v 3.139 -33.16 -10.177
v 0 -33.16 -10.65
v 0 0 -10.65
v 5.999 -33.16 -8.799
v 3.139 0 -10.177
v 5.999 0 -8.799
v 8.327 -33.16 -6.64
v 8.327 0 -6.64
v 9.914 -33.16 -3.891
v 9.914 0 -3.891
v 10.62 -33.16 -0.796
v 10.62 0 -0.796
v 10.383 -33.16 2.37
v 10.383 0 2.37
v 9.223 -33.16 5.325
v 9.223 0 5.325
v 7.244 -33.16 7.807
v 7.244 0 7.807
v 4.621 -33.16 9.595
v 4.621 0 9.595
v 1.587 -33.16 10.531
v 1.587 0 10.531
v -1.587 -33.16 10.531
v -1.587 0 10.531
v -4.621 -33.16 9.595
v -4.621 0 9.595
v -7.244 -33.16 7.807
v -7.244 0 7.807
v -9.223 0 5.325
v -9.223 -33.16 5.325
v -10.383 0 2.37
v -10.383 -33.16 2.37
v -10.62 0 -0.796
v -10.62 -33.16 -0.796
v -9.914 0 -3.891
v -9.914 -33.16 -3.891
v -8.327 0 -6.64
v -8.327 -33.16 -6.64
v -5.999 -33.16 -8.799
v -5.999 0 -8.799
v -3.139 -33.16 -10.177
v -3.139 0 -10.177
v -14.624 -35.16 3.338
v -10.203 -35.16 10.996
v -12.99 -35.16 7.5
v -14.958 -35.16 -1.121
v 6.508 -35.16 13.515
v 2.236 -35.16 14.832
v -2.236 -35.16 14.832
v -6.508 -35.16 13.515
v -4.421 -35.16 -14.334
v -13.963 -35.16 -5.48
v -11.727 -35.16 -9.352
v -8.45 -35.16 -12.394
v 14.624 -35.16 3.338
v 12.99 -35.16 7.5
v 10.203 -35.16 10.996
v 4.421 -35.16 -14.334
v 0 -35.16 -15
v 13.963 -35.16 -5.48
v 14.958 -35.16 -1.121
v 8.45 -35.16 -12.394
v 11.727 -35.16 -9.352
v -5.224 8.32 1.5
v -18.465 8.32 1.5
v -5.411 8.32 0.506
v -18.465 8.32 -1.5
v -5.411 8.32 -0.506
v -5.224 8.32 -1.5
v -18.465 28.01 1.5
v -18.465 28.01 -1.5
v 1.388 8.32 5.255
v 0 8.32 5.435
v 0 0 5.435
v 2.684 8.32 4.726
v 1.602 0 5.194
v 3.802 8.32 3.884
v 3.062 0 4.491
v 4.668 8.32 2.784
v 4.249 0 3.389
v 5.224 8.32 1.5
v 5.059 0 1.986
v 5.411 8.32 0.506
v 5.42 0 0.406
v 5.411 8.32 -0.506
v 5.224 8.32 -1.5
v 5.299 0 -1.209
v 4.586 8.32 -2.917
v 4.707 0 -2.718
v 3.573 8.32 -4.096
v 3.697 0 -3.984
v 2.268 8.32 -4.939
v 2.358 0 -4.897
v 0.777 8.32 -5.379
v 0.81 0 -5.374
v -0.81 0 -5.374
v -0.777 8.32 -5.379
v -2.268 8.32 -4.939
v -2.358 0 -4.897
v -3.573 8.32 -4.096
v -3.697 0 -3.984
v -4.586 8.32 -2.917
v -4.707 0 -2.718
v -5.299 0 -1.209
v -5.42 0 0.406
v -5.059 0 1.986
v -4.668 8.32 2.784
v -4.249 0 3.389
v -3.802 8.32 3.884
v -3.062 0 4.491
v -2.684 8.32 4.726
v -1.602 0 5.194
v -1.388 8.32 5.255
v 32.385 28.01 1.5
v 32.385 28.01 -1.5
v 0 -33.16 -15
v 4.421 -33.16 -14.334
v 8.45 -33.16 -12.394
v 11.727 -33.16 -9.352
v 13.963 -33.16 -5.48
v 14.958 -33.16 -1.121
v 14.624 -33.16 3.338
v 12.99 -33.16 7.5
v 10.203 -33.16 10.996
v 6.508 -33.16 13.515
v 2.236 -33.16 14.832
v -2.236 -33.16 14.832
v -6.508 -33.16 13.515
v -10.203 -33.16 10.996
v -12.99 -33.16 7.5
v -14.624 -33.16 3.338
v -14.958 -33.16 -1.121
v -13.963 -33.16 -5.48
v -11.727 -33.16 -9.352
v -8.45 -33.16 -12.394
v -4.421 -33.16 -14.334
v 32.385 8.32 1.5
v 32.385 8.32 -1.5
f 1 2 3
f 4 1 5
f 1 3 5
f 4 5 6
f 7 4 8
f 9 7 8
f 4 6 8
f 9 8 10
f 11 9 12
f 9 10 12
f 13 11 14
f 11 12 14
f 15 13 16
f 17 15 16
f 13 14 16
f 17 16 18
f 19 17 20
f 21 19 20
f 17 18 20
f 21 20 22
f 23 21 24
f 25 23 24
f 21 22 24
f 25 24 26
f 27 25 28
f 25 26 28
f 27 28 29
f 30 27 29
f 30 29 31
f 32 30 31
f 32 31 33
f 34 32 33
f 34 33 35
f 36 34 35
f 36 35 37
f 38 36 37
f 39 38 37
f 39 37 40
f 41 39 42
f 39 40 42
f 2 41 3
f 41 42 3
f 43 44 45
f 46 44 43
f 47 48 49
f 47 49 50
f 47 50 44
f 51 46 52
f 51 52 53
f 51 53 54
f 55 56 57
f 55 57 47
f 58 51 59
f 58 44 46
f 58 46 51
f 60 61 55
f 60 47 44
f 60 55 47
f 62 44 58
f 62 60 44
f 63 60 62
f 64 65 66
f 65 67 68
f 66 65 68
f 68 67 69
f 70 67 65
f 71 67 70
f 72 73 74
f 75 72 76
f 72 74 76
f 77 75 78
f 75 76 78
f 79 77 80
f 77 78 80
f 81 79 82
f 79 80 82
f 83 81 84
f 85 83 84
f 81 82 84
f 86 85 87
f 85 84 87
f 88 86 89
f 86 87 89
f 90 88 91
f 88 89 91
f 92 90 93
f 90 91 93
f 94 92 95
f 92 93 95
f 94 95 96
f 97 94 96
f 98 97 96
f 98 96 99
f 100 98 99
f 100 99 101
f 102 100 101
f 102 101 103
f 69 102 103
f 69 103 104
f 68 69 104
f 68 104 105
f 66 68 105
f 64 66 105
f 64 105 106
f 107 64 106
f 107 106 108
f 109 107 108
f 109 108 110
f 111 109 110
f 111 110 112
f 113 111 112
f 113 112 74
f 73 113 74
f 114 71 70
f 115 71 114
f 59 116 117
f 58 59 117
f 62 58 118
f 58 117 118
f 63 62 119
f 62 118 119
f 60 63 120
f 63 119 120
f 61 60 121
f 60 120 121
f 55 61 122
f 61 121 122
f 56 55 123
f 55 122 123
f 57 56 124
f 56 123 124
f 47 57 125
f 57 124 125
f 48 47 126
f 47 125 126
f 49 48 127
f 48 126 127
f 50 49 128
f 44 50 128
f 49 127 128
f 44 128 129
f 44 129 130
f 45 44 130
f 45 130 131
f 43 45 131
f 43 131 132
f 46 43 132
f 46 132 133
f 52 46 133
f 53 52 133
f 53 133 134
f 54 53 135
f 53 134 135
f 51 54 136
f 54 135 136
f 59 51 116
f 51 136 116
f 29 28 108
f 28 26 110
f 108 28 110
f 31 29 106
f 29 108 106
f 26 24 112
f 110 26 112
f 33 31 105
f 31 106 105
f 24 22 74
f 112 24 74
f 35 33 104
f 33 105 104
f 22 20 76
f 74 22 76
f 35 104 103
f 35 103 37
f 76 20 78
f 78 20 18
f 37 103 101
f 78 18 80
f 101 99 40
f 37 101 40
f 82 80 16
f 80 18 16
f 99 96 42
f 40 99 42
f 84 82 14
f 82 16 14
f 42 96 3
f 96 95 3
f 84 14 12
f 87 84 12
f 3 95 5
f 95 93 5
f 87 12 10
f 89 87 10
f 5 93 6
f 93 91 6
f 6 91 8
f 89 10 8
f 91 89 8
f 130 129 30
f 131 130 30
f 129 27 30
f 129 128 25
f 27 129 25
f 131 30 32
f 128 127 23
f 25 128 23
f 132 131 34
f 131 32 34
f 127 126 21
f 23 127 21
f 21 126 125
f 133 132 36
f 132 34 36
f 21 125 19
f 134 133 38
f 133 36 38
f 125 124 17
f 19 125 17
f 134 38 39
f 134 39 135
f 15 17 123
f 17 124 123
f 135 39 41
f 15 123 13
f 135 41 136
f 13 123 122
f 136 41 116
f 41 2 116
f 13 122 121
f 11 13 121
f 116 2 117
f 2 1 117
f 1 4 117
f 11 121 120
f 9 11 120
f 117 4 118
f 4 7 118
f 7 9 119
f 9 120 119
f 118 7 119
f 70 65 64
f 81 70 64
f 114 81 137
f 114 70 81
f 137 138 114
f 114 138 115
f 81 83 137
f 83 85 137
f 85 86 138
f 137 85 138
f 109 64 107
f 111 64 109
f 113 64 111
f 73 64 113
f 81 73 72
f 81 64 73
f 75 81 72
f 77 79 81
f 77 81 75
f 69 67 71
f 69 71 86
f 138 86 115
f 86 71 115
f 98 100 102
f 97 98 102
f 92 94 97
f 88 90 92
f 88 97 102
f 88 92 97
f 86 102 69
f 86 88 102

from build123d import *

# Parameters (mm, degrees)
SKETCH2_R                = 5.435
BOSS_EXTRUDE1_DEPTH      = 8.32
BOSS_EXTRUDE2_DEPTH      = 1.5
BOSS_EXTRUDE2_DEPTH_BACK = 1.5
SKETCH4_W                = 50.85
SKETCH4_H                = 19.69
SKETCH5_R                = 10.65
BOSS_EXTRUDE3_DEPTH      = 33.16
SKETCH6_R                = 15
BOSS_EXTRUDE4_DEPTH      = 2


with BuildPart() as part:
    # Sketch2 → Boss-Extrude1 (new body)
    with BuildSketch(Plane(origin=(0, 0, 0), x_dir=(1, 0, 0), z_dir=(0, 1, 0))):
        Circle(SKETCH2_R)
    extrude(amount=BOSS_EXTRUDE1_DEPTH)

    # Sketch4 → Boss-Extrude2 (add, two sides: drawn at the far end of the back side and taken through both)
    with BuildSketch(Plane.XY.offset(-BOSS_EXTRUDE2_DEPTH_BACK)):
        with Locations((6.96, 18.165)):
            Rectangle(SKETCH4_W, SKETCH4_H)
    extrude(amount=BOSS_EXTRUDE2_DEPTH + BOSS_EXTRUDE2_DEPTH_BACK)

    # Sketch5 → Boss-Extrude3 (add)
    with BuildSketch(Plane.XZ):
        Circle(SKETCH5_R)
    extrude(amount=BOSS_EXTRUDE3_DEPTH)

    # Sketch6 → Boss-Extrude4 (add)
    with BuildSketch(Plane.XZ.offset(33.16)):
        Circle(SKETCH6_R)
    extrude(amount=BOSS_EXTRUDE4_DEPTH)


solid = part.part
